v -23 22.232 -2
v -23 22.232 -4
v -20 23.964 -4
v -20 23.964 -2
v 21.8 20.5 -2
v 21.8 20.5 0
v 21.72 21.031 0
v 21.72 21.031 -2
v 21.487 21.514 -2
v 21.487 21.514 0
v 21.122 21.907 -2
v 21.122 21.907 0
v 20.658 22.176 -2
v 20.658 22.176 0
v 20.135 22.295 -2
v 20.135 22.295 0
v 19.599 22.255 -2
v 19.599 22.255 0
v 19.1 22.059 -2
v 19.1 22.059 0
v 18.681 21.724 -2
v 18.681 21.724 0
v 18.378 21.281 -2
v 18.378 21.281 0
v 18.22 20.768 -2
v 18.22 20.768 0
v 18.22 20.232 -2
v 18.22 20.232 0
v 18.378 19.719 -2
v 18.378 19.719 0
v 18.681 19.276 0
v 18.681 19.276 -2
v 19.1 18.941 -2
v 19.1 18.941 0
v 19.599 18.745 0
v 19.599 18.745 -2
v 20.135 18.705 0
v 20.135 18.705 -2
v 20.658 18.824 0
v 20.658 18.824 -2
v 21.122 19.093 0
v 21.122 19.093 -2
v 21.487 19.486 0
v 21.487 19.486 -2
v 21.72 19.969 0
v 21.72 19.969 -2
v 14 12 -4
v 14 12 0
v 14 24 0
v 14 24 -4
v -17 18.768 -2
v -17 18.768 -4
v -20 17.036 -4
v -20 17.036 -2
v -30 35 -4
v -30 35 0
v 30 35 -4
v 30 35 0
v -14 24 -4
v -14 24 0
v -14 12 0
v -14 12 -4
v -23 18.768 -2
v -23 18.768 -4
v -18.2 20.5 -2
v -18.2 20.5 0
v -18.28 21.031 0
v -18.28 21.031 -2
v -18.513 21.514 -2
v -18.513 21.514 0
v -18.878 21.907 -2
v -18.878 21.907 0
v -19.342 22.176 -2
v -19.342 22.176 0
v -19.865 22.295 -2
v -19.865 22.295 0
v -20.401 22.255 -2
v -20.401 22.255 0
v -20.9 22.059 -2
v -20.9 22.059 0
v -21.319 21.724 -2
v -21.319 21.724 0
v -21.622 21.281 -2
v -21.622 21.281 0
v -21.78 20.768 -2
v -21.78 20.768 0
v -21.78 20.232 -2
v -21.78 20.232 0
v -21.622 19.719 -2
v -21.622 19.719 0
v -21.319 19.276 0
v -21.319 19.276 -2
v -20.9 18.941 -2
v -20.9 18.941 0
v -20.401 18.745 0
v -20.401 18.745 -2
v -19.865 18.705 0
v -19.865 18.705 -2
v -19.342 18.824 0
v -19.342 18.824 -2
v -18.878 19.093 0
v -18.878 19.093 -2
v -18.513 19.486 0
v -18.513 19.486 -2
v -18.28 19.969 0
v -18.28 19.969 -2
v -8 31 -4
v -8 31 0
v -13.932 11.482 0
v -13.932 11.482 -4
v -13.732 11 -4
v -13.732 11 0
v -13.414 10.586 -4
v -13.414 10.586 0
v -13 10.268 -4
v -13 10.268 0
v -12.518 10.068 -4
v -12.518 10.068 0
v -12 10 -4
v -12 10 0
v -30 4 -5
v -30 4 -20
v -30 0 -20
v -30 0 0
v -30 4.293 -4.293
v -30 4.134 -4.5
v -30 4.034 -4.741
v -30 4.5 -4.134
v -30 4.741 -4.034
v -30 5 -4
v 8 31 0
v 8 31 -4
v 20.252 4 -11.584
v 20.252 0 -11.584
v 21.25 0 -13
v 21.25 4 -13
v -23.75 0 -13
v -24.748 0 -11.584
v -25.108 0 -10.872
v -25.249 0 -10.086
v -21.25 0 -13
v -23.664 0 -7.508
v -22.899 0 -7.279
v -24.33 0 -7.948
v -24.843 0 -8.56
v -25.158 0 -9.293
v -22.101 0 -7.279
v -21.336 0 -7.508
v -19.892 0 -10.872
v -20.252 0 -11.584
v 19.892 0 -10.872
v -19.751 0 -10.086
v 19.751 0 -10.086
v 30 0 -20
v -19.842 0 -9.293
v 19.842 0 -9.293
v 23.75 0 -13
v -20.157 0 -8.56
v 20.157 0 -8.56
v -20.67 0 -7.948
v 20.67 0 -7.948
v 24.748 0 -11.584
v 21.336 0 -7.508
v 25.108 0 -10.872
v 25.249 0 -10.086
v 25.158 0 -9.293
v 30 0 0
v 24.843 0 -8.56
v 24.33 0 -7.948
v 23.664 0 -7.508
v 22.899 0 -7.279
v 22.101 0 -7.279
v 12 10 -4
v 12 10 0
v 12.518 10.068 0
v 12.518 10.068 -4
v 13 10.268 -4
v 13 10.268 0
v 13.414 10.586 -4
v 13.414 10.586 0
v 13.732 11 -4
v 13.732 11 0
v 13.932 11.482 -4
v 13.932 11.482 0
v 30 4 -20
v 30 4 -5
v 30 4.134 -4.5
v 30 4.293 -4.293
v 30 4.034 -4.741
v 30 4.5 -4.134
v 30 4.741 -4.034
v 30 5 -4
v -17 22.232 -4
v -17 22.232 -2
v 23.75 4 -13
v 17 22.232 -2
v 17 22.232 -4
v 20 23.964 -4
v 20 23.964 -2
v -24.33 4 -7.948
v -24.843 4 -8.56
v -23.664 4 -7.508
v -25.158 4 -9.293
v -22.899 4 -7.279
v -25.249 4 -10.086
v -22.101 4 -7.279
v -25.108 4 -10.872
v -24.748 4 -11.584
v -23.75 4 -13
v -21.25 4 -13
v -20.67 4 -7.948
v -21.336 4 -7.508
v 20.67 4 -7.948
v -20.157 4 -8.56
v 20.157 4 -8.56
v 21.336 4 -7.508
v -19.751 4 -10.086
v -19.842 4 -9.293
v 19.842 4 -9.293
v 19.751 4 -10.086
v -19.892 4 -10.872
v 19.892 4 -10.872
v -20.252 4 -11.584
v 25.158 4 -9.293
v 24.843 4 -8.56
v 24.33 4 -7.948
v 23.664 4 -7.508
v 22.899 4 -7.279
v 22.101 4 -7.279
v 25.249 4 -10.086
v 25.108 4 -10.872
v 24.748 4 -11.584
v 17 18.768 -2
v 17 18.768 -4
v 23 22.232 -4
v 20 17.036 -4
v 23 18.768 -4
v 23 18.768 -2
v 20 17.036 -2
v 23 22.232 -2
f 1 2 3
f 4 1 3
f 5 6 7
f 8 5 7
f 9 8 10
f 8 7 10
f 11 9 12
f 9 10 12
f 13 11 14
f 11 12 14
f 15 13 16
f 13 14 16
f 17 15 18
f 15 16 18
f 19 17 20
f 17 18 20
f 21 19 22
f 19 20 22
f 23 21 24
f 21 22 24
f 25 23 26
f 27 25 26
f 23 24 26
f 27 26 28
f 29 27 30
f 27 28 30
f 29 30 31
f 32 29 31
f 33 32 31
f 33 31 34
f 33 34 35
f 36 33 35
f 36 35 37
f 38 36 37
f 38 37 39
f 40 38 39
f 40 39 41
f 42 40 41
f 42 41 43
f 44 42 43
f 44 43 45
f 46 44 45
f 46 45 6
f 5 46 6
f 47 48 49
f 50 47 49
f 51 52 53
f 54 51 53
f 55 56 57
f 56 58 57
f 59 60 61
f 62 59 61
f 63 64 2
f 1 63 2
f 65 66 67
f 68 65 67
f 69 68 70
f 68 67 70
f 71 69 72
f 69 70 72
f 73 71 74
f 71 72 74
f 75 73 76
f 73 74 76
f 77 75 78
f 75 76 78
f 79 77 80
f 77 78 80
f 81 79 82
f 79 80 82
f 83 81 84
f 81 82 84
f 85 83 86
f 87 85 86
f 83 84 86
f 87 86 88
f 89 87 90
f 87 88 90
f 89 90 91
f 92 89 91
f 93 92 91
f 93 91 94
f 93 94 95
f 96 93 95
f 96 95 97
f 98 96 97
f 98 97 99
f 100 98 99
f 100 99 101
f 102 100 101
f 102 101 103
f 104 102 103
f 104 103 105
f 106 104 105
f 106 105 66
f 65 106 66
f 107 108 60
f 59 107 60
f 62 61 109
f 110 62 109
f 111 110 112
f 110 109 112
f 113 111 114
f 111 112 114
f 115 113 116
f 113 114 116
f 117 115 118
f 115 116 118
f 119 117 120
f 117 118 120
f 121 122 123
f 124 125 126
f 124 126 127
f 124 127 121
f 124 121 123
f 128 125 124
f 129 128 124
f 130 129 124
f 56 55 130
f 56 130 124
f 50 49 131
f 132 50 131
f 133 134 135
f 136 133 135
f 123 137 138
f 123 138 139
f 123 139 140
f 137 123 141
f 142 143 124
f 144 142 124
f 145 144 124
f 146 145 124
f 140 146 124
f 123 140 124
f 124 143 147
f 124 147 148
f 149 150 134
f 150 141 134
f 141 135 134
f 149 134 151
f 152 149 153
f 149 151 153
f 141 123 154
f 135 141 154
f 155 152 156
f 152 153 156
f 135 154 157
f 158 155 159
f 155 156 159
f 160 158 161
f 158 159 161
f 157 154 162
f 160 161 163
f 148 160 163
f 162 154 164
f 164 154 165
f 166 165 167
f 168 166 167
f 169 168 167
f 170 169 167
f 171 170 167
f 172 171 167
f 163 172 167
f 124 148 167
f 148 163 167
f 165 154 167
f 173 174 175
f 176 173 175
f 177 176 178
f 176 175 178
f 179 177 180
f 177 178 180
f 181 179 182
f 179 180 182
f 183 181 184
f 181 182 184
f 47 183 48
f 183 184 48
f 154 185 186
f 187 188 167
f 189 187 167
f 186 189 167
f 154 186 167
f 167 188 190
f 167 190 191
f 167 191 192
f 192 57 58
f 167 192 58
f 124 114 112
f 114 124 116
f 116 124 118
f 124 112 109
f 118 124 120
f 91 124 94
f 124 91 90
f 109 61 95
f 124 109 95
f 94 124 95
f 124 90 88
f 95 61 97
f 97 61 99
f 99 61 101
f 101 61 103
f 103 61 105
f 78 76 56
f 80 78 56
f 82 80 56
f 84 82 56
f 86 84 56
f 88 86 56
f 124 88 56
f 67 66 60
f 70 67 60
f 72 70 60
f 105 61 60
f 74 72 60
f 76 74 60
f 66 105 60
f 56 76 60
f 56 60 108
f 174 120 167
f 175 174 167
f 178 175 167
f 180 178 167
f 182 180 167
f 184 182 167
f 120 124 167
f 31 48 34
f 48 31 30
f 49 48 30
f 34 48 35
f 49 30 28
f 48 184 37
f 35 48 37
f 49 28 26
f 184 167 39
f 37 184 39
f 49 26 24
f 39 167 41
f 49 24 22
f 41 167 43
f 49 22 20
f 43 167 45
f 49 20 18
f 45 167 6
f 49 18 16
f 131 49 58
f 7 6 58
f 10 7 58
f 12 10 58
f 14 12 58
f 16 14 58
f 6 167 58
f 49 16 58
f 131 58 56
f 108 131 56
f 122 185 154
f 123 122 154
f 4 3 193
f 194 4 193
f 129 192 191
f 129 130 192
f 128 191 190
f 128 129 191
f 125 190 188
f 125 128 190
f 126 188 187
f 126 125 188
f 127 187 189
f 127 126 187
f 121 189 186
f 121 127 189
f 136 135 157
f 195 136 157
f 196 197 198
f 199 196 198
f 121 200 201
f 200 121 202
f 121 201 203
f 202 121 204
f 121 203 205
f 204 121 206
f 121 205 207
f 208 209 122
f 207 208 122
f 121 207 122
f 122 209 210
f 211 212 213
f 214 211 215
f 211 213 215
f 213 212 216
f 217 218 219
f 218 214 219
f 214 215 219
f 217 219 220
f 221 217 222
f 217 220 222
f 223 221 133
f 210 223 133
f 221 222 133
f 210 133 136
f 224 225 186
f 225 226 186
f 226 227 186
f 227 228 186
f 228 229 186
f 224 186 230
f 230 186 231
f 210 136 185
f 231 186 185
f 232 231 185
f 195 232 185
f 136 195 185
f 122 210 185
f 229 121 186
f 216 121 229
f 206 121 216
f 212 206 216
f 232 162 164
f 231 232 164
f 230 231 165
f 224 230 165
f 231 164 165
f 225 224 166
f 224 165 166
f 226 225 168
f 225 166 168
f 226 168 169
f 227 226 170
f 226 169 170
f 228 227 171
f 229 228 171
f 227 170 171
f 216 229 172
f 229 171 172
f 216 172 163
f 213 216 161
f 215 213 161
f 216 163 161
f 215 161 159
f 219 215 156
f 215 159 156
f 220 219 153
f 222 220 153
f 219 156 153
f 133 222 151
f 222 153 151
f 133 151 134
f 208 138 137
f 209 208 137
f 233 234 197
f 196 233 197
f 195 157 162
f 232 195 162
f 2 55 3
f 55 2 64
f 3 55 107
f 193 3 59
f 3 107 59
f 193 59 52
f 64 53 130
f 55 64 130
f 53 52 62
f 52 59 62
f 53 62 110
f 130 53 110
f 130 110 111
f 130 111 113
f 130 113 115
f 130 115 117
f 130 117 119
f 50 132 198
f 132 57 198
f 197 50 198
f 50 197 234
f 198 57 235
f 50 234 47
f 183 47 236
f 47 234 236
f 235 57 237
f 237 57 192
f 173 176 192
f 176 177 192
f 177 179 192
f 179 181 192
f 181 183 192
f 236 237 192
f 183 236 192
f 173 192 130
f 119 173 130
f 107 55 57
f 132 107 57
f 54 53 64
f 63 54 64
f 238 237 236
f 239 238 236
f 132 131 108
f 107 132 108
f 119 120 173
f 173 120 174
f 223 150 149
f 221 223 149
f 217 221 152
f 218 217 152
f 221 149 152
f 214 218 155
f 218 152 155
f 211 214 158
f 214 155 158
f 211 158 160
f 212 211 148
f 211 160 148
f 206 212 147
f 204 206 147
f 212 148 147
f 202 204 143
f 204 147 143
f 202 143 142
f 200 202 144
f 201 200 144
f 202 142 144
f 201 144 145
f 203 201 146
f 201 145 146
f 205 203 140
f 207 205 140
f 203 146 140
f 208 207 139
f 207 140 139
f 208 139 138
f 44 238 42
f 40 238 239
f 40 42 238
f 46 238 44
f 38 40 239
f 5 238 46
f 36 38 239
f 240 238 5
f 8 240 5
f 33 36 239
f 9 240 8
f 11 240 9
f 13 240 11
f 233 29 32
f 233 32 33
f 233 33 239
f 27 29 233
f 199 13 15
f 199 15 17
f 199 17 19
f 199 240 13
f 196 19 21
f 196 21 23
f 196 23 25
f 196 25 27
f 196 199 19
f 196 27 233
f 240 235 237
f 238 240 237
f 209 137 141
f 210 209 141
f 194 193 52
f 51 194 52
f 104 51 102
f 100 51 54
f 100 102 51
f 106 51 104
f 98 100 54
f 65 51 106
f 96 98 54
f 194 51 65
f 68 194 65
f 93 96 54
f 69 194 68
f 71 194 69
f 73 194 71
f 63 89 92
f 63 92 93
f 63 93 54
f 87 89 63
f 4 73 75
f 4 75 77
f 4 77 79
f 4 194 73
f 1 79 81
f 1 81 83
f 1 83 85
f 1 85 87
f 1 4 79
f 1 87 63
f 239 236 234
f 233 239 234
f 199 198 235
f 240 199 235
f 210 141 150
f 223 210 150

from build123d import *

# Parameters (mm, degrees)
SALIENTE_EXTRUIR1_DEPTH = 30
CROQUIS2_R              = 1.8
CORTAR_EXTRUIR1_DEPTH   = 21
CORTAR_EXTRUIR2_DEPTH   = 36
REDONDEO1_R             = 1
CORTAR_EXTRUIR3_DEPTH   = 2


with BuildPart() as part:
    # Croquis1 → Saliente-Extruir1 (new body, symmetric)
    with BuildSketch(Plane(origin=(0, 0, 0), x_dir=(0, 0, -1), z_dir=(1, 0, 0))):
        Polygon((0, 0), (0, 35), (4, 35), (4, 4), (20, 4), (20, 0), align=None)
    extrude(amount=SALIENTE_EXTRUIR1_DEPTH, both=True)

    # Croquis2 → Cortar-Extruir1 (cut, through all)
    with BuildSketch(Plane.XY):
        with Locations((-20, 20.5)):
            Circle(CROQUIS2_R)
        with Locations((20, 20.5)):
            Circle(CROQUIS2_R)
        with BuildLine():
            Line((-12, 10), (12, 10))
            ThreePointArc((12, 10), (13.414213562, 10.585786438), (14, 12))
            Line((14, 12), (14, 24))
            Line((14, 24), (8, 31))
            Line((8, 31), (-8, 31))
            Line((-8, 31), (-14, 24))
            Line((-14, 24), (-14, 12))
            ThreePointArc((-14, 12), (-13.414213562, 10.585786438), (-12, 10))
        make_face()
    extrude(amount=-CORTAR_EXTRUIR1_DEPTH, mode=Mode.SUBTRACT)

    # Croquis3 → Cortar-Extruir2 (cut, through all)
    with BuildSketch(Plane.XZ):
        with BuildLine():
            Line((-24.747814832, -11.58424382), (-23.75, -13))
            Line((-23.75, -13), (-21.25, -13))
            Line((-21.25, -13), (-20.252185168, -11.58424382))
            ThreePointArc((-20.252185168, -11.58424382), (-22.5, -7.25), (-24.747814832, -11.58424382))
        make_face()
        with BuildLine():
            Line((20.252185168, -11.58424382), (21.25, -13))
            Line((21.25, -13), (23.75, -13))
            Line((23.75, -13), (24.747814832, -11.58424382))
            ThreePointArc((24.747814832, -11.58424382), (22.5, -7.25), (20.252185168, -11.58424382))
        make_face()
    extrude(amount=-CORTAR_EXTRUIR2_DEPTH, mode=Mode.SUBTRACT)

    # Redondeo1
    redondeo1_edges = [part.edges().sort_by_distance(p)[0] for p in [
        (0, 4, -4),
    ]]
    fillet(redondeo1_edges, radius=REDONDEO1_R)

    # Croquis4 → Cortar-Extruir3 (cut)
    with BuildSketch(Plane(origin=(0, 0, -4), x_dir=(-1, 0, 0), z_dir=(0, 0, -1))):
        Polygon((-17, 18.767949192), (-17, 22.232050808), (-20, 23.964101615), (-23, 22.232050808), (-23, 18.767949192), (-20, 17.035898385), align=None)
        Polygon((17, 18.767949192), (20, 17.035898385), (23, 18.767949192), (23, 22.232050808), (20, 23.964101615), (17, 22.232050808), align=None)
    extrude(amount=-CORTAR_EXTRUIR3_DEPTH, mode=Mode.SUBTRACT)


solid = part.part
